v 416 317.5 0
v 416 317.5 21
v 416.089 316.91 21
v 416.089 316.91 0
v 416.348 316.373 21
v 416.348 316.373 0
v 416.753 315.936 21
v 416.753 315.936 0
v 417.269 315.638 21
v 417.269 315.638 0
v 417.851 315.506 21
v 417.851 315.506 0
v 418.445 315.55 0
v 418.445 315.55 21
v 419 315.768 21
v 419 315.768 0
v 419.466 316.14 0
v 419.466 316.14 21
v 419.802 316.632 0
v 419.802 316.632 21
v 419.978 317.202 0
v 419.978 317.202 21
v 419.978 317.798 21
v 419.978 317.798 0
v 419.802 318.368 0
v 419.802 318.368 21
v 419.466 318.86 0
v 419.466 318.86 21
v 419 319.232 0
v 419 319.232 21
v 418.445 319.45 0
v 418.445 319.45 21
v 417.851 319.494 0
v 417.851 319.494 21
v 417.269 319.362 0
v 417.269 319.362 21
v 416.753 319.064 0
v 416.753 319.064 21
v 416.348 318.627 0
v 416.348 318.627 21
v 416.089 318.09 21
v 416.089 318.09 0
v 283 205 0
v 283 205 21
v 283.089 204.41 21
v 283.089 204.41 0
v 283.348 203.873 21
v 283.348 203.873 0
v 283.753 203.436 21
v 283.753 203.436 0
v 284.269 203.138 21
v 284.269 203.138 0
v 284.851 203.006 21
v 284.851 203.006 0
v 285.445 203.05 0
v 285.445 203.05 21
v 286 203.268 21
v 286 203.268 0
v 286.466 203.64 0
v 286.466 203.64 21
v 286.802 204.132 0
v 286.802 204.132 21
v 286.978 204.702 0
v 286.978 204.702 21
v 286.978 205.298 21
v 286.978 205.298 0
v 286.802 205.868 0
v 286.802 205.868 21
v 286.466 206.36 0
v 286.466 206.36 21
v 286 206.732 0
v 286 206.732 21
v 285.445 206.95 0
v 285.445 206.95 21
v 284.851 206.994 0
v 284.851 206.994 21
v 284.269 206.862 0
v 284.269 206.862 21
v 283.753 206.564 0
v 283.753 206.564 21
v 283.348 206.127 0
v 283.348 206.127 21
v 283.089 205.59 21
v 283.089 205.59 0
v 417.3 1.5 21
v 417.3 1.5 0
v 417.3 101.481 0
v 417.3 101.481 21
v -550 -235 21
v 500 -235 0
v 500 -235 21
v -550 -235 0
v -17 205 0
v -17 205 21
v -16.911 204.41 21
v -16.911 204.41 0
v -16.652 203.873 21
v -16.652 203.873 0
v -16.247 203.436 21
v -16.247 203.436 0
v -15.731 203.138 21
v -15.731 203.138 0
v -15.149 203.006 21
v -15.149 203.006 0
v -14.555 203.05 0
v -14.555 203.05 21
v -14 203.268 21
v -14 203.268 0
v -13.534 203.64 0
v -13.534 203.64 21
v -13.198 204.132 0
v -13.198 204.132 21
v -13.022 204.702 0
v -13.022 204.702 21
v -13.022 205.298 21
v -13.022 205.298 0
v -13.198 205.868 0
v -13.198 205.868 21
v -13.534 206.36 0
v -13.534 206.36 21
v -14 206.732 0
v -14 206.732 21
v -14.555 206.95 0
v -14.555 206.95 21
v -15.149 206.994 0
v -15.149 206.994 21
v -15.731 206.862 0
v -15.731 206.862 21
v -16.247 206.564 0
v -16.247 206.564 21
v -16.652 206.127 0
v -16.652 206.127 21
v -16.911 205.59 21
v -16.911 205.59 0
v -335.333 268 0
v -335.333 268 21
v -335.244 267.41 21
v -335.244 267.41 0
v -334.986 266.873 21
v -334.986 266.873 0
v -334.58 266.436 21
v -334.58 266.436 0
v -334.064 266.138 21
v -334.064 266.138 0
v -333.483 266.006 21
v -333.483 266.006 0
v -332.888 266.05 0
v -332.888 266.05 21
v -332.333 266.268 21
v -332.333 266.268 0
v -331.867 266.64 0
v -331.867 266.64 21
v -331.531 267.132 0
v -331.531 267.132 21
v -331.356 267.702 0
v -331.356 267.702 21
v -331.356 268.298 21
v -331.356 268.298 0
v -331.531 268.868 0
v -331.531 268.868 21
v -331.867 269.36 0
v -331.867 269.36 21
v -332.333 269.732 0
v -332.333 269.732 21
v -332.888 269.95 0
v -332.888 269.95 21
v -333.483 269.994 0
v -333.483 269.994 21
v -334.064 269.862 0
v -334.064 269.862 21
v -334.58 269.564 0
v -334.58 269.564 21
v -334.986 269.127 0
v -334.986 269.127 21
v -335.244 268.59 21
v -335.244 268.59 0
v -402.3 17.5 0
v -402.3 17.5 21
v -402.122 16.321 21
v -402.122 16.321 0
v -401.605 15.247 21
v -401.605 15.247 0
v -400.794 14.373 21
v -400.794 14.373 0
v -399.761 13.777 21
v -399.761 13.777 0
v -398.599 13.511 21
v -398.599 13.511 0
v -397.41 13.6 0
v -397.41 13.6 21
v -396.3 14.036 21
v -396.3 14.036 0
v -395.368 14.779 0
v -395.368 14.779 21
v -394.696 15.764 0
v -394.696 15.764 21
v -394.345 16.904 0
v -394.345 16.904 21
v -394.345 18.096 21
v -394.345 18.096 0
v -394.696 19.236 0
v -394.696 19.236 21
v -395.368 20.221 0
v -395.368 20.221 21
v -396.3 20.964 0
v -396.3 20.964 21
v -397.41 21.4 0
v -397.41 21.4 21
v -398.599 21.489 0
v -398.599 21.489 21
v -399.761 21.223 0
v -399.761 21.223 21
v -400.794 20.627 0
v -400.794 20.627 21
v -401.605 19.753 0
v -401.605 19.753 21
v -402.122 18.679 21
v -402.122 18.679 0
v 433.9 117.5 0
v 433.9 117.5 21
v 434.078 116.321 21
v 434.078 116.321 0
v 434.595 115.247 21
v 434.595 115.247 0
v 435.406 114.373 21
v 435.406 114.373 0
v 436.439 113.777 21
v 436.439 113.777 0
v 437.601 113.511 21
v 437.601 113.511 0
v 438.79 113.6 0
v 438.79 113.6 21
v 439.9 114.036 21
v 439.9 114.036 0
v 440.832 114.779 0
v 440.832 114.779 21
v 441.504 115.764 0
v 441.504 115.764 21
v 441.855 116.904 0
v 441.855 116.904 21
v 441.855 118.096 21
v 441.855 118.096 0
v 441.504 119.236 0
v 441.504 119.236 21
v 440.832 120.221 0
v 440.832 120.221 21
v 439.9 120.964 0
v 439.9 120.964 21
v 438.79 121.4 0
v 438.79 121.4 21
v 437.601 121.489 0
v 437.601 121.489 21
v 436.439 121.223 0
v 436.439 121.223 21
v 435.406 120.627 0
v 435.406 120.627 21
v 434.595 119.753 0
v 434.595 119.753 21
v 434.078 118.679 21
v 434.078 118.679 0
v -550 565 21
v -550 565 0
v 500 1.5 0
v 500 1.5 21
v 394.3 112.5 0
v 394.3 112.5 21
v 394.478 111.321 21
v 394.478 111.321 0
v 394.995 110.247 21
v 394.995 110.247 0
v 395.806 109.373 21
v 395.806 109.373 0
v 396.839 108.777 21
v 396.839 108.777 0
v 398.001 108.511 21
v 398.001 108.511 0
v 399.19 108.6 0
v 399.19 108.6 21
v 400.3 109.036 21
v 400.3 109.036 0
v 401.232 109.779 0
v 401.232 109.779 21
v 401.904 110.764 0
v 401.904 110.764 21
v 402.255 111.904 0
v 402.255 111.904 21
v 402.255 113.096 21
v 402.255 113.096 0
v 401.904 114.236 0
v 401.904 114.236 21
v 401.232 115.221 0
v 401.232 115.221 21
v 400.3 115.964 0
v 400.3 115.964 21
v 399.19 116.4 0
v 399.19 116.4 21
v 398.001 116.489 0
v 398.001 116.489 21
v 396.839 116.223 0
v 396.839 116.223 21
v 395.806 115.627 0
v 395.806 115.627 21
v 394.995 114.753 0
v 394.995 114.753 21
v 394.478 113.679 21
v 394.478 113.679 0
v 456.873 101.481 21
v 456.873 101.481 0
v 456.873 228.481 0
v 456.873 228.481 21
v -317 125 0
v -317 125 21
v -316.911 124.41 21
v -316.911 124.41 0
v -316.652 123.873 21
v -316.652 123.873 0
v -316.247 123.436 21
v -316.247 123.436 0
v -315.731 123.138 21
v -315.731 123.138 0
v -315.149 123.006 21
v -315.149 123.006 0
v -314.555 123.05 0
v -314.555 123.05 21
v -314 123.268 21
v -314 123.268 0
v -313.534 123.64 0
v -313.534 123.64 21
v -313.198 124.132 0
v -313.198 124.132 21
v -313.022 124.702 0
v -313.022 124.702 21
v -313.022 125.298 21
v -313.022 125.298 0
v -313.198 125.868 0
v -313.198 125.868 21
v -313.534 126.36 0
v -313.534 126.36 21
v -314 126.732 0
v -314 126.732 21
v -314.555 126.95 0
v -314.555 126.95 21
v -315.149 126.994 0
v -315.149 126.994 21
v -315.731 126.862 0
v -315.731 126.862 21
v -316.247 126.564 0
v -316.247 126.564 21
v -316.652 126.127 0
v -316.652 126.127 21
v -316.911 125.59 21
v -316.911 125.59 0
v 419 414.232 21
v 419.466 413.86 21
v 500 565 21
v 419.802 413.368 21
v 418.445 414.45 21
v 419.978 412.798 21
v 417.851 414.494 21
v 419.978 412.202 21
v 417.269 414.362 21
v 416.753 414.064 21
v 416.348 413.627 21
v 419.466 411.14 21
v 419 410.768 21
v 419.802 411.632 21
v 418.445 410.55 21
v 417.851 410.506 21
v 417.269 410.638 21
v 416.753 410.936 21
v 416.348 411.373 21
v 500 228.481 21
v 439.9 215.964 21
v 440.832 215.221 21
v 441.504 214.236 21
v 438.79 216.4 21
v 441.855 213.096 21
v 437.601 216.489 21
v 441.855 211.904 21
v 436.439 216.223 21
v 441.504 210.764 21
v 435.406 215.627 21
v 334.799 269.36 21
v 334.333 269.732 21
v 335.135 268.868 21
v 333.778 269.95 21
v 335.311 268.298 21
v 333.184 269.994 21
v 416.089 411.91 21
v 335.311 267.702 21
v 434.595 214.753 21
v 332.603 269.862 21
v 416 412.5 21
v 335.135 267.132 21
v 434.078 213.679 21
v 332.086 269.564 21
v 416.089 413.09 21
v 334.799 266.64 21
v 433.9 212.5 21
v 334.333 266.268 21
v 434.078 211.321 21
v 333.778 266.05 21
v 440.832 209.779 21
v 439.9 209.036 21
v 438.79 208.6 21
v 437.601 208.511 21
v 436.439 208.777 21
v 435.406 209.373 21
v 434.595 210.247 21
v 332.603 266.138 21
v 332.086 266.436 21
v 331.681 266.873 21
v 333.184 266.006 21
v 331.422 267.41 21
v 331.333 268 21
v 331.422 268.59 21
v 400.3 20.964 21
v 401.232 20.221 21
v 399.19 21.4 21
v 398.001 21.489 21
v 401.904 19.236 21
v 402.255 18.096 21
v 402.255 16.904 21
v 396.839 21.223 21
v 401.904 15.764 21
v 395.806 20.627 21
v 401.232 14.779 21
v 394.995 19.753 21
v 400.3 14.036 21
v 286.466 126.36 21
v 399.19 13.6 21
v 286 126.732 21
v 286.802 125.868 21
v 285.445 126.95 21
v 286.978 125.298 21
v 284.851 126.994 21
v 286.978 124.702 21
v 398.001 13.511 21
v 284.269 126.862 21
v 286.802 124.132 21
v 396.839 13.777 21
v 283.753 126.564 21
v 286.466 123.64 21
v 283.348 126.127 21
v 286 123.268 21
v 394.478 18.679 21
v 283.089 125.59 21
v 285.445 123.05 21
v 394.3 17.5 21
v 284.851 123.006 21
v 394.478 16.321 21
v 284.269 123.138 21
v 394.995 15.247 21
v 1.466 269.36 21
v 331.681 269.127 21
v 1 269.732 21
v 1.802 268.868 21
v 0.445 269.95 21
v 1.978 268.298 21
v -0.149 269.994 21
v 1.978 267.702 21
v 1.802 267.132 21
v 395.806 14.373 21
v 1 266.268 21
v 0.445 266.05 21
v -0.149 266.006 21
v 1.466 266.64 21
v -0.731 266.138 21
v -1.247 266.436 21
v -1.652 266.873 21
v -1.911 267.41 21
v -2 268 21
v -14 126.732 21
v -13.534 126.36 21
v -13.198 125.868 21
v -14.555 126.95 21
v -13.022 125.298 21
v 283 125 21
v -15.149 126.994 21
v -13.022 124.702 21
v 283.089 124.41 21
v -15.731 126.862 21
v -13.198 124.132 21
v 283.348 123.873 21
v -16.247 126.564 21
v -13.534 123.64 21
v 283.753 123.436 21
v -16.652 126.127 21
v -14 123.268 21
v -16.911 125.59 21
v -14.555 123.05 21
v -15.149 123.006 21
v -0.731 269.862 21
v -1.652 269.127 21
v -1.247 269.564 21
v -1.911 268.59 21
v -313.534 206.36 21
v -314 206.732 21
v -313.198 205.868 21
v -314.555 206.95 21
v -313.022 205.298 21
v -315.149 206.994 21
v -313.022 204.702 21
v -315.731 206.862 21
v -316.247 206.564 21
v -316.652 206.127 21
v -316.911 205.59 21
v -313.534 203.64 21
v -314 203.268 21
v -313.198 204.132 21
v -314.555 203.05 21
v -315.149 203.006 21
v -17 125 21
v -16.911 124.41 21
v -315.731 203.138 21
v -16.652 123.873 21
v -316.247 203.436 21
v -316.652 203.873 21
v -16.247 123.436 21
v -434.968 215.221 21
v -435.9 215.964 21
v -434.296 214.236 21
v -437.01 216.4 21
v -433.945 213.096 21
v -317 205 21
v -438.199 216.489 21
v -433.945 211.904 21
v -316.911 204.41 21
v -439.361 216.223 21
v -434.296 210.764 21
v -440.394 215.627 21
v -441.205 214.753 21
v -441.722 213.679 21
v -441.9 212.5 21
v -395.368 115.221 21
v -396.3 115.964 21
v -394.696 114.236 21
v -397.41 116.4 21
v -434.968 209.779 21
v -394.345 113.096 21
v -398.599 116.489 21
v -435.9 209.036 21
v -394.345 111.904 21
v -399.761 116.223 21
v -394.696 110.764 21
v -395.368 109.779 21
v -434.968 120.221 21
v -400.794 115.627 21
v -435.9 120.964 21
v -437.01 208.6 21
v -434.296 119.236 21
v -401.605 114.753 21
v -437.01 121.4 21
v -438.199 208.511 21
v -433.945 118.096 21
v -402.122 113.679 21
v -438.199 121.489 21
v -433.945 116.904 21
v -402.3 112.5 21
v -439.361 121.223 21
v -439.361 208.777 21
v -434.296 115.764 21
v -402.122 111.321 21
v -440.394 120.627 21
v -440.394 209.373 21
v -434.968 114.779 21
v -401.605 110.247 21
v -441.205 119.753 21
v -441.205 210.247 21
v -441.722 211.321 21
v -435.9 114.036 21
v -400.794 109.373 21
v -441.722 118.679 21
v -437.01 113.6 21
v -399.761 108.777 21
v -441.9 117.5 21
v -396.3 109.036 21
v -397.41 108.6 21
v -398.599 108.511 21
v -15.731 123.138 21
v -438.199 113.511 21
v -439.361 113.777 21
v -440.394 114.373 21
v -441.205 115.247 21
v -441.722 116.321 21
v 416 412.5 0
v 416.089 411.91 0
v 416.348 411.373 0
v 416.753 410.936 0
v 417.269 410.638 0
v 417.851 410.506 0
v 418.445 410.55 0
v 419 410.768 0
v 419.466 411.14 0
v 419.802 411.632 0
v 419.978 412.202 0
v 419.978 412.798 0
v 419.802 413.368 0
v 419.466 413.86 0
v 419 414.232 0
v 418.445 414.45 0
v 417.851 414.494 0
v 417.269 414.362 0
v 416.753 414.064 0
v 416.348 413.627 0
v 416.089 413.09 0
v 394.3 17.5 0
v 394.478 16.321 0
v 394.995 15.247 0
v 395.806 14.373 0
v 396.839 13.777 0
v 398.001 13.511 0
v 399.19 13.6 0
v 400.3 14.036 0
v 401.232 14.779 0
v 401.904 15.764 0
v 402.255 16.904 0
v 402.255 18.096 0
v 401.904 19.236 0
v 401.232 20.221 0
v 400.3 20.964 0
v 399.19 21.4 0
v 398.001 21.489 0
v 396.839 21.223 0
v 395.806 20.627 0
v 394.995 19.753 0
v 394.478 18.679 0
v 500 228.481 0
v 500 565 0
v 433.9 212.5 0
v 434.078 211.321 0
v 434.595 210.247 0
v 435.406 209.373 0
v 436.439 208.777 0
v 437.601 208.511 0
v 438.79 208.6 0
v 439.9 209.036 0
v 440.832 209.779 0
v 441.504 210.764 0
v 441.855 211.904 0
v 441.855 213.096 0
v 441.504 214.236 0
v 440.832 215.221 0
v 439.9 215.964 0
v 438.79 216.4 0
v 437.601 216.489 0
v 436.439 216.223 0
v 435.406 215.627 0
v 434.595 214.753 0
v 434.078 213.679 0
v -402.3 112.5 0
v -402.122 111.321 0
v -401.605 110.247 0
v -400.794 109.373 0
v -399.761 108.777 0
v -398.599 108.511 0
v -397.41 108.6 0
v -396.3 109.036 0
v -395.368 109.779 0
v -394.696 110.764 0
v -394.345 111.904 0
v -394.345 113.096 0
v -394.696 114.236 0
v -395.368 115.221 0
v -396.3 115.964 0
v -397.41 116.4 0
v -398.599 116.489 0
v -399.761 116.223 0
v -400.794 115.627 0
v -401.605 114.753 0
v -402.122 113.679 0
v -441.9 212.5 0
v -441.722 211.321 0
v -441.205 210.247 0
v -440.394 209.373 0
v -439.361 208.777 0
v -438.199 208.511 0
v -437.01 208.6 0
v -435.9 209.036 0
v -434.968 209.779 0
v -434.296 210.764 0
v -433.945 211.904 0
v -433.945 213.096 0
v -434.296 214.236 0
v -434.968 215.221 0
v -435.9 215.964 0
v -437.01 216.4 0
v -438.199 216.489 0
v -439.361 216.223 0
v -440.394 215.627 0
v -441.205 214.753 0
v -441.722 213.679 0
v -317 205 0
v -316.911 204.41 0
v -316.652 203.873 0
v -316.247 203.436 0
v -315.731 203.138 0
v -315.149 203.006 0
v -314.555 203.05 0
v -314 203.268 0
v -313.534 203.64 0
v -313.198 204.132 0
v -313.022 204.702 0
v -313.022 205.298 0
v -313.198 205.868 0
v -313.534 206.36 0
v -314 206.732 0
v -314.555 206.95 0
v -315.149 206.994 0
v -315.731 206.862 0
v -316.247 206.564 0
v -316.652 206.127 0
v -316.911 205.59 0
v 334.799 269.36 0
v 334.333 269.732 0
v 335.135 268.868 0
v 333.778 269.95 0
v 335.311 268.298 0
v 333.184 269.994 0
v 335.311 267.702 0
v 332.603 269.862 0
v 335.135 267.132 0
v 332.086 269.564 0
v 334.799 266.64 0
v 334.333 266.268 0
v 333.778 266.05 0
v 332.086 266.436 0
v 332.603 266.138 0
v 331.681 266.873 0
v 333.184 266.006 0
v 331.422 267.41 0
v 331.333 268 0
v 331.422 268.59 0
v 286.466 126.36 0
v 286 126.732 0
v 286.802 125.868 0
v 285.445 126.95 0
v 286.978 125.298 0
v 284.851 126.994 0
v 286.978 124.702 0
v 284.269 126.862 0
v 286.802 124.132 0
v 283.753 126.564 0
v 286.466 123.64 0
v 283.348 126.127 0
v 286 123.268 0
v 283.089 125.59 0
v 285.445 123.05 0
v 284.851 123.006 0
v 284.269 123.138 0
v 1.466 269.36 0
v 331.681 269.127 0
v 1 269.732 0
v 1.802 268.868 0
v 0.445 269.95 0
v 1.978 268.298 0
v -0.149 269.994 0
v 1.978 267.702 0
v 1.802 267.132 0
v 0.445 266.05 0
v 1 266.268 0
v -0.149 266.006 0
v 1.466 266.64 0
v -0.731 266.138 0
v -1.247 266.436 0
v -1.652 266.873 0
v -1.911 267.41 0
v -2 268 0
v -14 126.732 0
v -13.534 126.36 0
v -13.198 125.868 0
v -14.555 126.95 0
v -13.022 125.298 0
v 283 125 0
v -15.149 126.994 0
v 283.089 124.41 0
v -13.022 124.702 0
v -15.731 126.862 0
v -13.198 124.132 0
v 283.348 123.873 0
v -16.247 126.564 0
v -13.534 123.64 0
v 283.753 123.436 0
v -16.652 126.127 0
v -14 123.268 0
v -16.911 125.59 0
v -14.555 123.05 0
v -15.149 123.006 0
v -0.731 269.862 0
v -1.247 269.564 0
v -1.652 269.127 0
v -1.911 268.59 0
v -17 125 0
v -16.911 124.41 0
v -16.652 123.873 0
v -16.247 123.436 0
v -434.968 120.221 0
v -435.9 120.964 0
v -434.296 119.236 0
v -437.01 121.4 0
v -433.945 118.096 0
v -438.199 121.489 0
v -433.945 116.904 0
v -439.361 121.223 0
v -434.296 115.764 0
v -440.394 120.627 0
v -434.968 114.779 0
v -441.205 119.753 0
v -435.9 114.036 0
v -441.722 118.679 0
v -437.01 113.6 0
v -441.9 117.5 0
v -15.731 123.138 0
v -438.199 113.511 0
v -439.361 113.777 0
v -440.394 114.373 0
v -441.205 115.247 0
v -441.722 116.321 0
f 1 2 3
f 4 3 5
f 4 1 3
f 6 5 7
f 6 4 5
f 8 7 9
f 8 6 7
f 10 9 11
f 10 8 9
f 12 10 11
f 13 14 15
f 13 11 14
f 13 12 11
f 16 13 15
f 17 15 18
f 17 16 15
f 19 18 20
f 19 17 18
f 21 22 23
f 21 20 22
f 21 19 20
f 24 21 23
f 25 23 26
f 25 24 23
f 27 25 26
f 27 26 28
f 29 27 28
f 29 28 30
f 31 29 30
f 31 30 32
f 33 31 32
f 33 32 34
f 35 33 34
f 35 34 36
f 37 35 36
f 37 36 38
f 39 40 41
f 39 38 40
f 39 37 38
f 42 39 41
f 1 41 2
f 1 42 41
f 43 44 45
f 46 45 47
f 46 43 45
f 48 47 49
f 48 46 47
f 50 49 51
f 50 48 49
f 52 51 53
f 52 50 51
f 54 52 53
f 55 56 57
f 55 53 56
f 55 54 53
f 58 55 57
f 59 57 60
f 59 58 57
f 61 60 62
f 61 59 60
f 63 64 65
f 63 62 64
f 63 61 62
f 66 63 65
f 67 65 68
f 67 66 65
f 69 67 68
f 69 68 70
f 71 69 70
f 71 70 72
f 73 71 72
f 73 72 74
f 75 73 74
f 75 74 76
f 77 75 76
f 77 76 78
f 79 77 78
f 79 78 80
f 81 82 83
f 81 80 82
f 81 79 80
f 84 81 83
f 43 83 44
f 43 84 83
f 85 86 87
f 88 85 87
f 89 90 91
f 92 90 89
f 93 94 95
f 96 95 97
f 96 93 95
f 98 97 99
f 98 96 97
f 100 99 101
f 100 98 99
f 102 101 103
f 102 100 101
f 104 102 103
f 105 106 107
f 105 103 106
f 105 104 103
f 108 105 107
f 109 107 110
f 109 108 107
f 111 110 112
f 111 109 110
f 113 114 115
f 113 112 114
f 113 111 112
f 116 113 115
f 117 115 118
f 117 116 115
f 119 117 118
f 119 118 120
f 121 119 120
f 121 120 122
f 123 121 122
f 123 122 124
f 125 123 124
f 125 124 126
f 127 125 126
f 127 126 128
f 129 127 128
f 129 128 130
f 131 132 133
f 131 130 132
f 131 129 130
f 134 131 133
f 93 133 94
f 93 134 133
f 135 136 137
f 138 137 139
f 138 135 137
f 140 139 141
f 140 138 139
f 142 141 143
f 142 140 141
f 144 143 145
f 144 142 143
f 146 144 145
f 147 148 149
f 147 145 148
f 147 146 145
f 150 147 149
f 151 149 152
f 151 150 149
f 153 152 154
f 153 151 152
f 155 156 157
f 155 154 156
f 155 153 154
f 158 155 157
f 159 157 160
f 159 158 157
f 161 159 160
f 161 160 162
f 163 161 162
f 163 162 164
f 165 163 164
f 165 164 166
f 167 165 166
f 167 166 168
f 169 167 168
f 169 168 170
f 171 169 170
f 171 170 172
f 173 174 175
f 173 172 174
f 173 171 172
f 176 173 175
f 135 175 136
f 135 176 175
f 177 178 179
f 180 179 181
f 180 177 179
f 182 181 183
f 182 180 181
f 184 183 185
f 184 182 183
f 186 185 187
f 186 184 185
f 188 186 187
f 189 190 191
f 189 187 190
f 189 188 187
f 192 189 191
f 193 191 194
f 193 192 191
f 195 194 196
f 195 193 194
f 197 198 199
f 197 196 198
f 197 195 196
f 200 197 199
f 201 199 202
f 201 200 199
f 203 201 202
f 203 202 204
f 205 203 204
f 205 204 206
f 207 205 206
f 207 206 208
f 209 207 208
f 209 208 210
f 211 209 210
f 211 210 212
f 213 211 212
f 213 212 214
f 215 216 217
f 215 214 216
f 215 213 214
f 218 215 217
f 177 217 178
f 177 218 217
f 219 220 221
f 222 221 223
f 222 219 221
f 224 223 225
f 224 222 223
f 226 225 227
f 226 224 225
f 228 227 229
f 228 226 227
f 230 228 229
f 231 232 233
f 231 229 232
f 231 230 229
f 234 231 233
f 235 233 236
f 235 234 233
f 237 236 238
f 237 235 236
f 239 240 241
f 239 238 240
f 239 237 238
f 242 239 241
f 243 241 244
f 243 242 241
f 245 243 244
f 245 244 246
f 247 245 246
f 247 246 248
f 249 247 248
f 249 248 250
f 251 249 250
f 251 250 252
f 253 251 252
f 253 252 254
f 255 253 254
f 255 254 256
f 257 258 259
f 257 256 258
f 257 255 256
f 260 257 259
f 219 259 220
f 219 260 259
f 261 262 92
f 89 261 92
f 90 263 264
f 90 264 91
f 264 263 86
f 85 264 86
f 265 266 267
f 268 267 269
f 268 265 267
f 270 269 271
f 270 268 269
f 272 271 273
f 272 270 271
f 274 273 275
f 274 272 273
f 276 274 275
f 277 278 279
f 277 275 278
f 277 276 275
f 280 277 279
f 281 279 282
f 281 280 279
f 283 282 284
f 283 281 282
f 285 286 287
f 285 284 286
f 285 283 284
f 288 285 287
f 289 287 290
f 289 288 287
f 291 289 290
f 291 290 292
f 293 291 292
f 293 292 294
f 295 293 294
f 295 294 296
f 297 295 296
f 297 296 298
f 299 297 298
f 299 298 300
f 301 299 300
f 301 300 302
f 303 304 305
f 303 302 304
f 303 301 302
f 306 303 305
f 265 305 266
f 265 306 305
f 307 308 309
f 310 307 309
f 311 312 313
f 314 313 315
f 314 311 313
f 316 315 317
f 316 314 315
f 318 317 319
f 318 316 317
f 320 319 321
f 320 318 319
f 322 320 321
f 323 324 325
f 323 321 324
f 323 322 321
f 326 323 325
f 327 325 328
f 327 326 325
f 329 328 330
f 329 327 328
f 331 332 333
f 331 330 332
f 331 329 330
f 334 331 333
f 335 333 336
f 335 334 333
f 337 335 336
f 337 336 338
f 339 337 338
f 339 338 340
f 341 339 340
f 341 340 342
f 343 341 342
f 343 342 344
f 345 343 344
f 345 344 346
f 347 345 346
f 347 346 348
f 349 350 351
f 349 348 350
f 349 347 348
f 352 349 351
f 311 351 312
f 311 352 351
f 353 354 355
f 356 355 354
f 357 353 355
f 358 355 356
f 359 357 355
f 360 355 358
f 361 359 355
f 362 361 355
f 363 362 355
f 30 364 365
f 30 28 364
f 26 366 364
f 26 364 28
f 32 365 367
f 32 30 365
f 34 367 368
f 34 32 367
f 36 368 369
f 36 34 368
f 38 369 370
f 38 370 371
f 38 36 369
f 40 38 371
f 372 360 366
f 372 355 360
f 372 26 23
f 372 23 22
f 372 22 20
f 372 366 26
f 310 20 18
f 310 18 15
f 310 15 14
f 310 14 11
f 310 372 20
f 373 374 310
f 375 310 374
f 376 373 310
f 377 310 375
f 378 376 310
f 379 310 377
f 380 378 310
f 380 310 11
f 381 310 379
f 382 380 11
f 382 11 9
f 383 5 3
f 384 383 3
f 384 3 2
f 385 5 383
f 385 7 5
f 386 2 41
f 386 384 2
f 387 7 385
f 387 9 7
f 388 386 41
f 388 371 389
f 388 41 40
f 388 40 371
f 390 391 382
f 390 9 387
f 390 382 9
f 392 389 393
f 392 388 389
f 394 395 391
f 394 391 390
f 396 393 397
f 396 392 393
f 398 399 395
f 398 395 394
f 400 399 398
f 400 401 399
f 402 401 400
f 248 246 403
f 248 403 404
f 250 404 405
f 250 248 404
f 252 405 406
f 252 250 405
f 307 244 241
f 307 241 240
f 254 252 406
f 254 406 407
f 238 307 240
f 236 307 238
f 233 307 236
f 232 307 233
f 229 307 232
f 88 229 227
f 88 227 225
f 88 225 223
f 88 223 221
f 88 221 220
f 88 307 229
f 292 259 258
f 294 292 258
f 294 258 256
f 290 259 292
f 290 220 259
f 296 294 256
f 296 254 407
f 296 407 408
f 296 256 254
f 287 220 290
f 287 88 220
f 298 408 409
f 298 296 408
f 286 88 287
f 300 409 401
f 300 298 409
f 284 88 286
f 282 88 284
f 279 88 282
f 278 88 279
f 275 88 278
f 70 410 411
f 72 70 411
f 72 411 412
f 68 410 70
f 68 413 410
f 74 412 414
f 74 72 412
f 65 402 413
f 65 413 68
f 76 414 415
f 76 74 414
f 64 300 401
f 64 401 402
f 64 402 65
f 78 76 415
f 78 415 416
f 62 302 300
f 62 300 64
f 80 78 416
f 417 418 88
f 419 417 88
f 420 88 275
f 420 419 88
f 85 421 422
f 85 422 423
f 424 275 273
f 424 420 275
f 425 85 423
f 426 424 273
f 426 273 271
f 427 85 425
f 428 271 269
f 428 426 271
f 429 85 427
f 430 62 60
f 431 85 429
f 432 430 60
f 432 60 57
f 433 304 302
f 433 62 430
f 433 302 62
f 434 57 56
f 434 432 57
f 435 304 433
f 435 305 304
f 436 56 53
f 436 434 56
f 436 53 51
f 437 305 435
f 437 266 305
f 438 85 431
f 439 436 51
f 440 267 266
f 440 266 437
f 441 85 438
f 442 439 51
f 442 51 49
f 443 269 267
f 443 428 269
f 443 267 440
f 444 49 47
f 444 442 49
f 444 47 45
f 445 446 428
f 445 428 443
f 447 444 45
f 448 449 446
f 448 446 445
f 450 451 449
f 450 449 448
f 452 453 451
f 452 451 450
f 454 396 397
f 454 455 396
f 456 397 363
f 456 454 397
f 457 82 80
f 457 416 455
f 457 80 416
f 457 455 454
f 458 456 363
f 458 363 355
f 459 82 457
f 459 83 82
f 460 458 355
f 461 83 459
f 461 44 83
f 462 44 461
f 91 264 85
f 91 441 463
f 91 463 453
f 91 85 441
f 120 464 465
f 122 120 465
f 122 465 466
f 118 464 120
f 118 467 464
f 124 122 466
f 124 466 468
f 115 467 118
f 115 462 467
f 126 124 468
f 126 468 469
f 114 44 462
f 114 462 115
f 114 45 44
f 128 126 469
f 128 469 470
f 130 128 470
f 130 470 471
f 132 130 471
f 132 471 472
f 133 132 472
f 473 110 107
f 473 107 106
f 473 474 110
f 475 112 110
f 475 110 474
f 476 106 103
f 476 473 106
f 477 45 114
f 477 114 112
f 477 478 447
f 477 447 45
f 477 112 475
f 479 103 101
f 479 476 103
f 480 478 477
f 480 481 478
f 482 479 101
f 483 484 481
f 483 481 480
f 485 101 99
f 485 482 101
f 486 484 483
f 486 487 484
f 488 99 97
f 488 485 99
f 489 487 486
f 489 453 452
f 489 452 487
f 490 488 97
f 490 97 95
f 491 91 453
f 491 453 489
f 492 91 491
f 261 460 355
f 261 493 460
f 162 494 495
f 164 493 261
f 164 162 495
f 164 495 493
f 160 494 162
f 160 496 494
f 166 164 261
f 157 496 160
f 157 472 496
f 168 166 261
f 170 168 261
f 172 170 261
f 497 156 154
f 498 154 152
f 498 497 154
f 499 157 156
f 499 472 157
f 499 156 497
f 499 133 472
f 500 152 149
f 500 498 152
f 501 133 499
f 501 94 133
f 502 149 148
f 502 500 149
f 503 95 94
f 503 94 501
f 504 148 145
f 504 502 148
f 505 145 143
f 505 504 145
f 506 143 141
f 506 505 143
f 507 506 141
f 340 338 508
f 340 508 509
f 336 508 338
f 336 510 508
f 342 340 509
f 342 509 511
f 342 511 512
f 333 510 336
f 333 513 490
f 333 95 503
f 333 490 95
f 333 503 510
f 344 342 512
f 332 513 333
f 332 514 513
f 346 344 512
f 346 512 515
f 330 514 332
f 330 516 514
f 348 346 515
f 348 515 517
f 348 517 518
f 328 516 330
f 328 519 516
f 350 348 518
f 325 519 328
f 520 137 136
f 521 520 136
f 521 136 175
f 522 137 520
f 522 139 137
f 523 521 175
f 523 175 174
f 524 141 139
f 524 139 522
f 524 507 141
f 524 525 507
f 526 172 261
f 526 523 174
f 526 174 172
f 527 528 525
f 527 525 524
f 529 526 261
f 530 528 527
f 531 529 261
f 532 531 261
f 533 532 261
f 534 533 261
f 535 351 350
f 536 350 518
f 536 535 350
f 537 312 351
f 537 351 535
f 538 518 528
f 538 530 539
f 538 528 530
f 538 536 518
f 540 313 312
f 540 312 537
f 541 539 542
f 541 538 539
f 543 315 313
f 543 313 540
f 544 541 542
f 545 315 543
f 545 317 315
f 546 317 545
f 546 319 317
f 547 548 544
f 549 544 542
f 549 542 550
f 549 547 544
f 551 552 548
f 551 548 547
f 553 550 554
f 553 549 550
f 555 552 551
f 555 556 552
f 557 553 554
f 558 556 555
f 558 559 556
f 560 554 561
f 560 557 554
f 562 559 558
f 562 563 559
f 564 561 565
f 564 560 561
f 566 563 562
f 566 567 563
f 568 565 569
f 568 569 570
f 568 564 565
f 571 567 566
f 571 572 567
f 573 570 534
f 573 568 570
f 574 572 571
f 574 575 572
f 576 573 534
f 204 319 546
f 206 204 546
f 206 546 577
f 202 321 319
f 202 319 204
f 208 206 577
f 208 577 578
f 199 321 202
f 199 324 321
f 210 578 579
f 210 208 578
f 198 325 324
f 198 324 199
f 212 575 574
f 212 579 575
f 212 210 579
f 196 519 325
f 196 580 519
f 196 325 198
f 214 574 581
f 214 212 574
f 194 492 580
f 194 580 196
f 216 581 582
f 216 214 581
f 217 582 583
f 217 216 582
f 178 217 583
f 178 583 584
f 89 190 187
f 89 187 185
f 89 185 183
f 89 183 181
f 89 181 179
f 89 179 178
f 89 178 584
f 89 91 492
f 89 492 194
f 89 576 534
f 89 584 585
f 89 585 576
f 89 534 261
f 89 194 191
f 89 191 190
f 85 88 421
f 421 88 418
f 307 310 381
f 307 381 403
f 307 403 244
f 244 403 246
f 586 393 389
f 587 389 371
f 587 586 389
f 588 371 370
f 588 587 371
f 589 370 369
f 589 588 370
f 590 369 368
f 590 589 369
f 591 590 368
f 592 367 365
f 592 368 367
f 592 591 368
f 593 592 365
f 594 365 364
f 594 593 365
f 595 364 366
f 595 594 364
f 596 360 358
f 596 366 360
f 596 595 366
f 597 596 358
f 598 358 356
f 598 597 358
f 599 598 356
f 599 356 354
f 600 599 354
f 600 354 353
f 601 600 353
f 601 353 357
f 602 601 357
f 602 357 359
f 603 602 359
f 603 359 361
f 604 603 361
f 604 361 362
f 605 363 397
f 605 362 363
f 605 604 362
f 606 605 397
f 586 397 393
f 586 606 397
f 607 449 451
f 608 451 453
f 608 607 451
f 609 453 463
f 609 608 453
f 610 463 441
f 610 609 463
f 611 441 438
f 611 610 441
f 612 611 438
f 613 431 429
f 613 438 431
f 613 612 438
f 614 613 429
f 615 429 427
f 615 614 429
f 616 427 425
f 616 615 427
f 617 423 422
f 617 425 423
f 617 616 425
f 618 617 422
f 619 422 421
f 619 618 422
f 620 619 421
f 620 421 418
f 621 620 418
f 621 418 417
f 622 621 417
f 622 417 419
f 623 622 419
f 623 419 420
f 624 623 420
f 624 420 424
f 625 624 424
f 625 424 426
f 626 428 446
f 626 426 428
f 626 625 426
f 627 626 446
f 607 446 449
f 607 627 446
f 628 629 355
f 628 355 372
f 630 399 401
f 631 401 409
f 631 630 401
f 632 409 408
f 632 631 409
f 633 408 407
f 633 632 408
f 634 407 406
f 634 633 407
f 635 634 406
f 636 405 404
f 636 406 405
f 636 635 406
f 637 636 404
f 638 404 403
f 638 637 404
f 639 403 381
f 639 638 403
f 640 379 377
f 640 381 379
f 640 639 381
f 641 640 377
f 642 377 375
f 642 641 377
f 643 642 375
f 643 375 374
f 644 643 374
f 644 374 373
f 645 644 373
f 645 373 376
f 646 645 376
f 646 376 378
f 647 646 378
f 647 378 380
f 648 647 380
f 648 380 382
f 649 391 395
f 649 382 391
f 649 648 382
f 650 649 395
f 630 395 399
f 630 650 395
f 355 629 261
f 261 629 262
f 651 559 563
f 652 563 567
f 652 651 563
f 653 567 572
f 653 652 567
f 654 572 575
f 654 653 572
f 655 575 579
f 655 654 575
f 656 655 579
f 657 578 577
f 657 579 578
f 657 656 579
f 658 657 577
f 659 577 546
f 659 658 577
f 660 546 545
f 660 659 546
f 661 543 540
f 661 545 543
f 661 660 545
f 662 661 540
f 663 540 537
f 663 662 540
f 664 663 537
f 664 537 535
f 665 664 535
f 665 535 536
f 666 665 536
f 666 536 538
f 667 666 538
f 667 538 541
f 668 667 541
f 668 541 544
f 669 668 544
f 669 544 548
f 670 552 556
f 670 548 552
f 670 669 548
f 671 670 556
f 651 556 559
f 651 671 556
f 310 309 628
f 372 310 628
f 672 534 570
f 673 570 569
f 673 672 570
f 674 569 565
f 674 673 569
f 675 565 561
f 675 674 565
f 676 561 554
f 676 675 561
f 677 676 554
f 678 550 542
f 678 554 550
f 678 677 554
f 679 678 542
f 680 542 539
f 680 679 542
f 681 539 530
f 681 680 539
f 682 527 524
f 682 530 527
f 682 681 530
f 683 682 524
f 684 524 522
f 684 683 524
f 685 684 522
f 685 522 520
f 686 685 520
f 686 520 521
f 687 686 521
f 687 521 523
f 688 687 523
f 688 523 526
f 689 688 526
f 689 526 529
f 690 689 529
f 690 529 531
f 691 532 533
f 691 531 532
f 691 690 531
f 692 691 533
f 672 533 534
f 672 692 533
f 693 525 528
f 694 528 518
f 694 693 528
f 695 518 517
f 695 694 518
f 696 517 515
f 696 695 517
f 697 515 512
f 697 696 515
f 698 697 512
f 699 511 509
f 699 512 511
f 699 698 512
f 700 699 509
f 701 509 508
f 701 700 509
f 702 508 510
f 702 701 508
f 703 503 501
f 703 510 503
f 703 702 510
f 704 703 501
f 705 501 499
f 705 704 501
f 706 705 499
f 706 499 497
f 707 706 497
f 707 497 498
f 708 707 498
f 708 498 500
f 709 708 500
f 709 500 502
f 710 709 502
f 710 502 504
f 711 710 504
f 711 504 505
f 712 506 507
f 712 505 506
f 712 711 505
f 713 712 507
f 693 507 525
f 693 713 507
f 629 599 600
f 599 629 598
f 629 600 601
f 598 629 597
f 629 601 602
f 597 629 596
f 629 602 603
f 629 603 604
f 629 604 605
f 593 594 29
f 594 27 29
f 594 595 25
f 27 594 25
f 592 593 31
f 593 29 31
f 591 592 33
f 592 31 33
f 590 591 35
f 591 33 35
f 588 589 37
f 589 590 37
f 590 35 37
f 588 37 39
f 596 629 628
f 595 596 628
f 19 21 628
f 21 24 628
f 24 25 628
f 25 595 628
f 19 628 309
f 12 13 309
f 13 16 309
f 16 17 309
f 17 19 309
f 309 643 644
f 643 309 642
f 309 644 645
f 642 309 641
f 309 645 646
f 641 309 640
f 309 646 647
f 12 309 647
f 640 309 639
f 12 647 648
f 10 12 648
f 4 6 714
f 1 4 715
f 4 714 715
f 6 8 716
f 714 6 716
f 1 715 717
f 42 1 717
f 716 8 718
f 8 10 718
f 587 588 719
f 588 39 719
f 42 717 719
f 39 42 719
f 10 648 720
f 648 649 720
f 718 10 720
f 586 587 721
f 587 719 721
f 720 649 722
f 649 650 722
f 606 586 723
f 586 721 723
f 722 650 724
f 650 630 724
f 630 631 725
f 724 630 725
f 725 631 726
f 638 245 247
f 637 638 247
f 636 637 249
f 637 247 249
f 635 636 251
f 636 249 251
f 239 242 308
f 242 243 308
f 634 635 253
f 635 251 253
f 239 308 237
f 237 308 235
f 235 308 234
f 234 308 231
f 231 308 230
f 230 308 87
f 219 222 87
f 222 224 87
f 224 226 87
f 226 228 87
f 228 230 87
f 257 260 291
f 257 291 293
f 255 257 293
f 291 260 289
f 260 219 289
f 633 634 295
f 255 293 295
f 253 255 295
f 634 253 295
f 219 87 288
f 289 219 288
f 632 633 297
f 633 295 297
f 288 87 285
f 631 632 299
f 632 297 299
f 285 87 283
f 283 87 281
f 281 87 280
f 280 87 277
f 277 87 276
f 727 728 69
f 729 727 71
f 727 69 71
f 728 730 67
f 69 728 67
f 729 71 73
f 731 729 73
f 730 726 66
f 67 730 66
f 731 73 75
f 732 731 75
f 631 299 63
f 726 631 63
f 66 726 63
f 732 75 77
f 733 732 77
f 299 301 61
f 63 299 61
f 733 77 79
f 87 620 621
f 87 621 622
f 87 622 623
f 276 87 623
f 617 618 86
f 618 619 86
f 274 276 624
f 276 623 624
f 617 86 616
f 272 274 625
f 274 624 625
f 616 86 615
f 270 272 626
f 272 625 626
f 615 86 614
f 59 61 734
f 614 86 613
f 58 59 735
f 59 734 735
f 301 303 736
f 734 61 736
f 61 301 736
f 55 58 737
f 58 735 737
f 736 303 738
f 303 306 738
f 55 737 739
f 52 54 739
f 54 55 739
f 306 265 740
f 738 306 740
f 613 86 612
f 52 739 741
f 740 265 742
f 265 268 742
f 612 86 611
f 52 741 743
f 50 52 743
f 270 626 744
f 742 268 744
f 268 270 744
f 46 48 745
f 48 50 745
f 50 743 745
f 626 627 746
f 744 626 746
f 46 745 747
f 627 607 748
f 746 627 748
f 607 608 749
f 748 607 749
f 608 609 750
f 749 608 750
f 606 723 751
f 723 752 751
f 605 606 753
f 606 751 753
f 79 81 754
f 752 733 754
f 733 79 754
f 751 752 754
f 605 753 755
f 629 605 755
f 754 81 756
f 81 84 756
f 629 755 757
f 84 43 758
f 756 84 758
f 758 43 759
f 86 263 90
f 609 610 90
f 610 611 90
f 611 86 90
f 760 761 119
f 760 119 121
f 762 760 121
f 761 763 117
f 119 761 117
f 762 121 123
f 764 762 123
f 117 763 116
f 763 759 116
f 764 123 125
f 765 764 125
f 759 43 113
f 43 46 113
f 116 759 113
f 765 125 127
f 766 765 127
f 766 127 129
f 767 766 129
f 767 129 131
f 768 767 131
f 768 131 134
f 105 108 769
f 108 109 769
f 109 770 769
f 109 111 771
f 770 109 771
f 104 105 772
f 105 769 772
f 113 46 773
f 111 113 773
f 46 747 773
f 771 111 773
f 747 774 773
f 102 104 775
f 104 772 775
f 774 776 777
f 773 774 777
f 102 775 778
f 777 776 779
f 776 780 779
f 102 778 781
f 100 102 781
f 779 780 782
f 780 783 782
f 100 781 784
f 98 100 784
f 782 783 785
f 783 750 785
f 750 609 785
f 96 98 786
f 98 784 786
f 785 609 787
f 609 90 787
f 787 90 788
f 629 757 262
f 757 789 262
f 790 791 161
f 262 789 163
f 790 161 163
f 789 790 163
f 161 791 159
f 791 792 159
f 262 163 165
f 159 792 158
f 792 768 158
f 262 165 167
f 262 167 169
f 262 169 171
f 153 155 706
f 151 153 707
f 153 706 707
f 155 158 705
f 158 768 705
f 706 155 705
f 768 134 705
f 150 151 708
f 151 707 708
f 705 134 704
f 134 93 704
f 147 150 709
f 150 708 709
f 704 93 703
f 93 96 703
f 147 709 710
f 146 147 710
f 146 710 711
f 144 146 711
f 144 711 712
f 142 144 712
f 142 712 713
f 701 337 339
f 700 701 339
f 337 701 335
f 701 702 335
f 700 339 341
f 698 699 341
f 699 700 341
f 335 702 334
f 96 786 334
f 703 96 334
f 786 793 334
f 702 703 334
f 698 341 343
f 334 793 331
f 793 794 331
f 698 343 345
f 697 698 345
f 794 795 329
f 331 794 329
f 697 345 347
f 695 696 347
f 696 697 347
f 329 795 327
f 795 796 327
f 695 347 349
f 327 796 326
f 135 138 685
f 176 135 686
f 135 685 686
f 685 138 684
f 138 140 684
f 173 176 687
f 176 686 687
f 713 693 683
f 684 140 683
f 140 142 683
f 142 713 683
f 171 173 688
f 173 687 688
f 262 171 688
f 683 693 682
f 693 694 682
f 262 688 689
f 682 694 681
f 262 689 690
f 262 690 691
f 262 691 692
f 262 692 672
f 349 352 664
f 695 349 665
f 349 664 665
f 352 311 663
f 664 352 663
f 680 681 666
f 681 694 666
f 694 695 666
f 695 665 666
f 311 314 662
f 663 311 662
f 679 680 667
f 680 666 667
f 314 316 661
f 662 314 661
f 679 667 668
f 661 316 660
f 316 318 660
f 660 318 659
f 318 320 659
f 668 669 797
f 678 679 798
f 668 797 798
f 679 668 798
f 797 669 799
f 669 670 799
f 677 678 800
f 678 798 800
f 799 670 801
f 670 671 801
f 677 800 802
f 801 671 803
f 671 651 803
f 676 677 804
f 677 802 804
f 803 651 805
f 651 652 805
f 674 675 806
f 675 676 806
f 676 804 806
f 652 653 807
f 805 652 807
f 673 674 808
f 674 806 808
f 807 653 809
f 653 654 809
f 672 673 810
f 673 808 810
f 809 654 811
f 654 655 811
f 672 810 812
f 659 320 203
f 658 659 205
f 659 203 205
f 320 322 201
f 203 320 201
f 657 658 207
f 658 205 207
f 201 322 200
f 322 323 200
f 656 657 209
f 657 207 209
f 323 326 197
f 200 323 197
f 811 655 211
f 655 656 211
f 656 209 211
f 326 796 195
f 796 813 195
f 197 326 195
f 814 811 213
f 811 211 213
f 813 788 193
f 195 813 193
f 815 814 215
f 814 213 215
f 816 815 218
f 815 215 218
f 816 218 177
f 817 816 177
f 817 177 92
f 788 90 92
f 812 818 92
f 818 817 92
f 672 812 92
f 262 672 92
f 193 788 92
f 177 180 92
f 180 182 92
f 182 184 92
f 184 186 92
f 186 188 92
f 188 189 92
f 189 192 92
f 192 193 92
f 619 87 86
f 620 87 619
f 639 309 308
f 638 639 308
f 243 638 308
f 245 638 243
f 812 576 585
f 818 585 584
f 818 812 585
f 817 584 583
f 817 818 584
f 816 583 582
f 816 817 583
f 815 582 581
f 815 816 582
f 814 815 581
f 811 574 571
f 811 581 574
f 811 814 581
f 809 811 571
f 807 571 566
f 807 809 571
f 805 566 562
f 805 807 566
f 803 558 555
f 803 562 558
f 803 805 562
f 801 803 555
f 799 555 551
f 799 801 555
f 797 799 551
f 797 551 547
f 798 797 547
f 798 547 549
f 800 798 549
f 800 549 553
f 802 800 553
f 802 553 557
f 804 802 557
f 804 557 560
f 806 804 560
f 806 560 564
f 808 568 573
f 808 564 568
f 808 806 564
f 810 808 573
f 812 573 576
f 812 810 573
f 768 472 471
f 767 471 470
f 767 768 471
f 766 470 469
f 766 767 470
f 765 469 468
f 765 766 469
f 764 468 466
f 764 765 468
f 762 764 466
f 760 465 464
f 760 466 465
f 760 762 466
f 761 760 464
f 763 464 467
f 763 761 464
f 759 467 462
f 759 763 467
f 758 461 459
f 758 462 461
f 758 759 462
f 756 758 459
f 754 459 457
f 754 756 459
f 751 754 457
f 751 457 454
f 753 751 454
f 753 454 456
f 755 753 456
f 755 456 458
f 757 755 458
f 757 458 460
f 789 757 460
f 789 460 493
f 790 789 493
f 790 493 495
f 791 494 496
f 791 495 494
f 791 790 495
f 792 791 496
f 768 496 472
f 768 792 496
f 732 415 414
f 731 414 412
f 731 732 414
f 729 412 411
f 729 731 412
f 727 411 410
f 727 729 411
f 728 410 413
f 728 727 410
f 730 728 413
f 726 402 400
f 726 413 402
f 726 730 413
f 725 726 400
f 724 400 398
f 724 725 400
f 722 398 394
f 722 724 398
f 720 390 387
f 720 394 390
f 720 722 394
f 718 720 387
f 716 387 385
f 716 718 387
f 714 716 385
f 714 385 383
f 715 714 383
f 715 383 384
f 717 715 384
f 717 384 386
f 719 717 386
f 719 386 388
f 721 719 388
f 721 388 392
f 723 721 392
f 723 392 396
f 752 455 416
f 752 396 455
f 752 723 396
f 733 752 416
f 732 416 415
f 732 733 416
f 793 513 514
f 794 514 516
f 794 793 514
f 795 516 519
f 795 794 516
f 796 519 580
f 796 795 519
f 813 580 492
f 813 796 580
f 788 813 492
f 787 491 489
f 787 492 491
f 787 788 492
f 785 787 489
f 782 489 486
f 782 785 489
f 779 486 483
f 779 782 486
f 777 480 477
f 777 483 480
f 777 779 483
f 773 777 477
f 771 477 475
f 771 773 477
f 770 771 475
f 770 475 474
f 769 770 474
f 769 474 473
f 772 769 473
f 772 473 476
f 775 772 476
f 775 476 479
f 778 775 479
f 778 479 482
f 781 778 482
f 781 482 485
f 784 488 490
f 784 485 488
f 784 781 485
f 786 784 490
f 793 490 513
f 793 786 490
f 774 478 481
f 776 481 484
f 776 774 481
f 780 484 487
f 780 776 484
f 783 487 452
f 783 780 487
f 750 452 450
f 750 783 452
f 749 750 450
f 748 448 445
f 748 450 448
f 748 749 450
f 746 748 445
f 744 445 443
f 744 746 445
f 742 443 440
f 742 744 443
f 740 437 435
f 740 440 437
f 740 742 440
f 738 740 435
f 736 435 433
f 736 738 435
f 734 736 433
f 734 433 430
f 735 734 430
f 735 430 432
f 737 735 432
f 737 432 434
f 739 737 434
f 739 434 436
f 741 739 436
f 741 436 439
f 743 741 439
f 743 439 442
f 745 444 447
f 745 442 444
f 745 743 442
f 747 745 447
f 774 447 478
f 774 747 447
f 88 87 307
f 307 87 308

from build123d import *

# Parameters (mm, degrees)
SKETCH_1_W                                   = 1050
SKETCH_1_H                                   = 800
PAD001_DEPTH                                 = 21
SKETCH003_R                                  = 4
SKETCH003_R_2                                = 2
POCKET_DEPTH                                 = 0.001
POCKET_DEPTH_BACK                            = 21.001
POCKET001_DEPTH                              = 0.001
POCKET001_DEPTH_BACK                         = 21.001
PLYWOOD_CUTTING_ROLL_SUPPORT_PLACEMENT_ANGLE = 180


with BuildPart() as part:
    # Sketch_1 → Pad001 (new body)
    with BuildSketch(Plane.XY):
        with Locations((25, -100)):
            Rectangle(SKETCH_1_W, SKETCH_1_H)
    extrude(amount=PAD001_DEPTH)

    # Sketch003 → Pocket (cut, two sides)
    with BuildSketch(Plane.XY) as pocket_sk:
        with Locations((-398.3, -47.5)):
            Circle(SKETCH003_R)
        with Locations((-398.3, 47.5)):
            Circle(SKETCH003_R)
        with Locations((398.3, -47.5)):
            Circle(SKETCH003_R)
        with Locations((398.3, 47.5)):
            Circle(SKETCH003_R)
        with Locations((-437.9, -147.5)):
            Circle(SKETCH003_R)
        with Locations((-437.9, -52.5)):
            Circle(SKETCH003_R)
        with Locations((437.9, -147.5)):
            Circle(SKETCH003_R)
        with Locations((437.9, -52.5)):
            Circle(SKETCH003_R)
        with Locations((15, -140)):
            Circle(SKETCH003_R_2)
        with Locations((15, -60)):
            Circle(SKETCH003_R_2)
        with Locations((315, -60)):
            Circle(SKETCH003_R_2)
        with Locations((315, -140)):
            Circle(SKETCH003_R_2)
        with Locations((-285, -140)):
            Circle(SKETCH003_R_2)
        with Locations((-285, -60)):
            Circle(SKETCH003_R_2)
        with Locations((-418, -252.5)):
            Circle(SKETCH003_R_2)
        with Locations((-418, -347.5)):
            Circle(SKETCH003_R_2)
        with Locations((0, -203)):
            Circle(SKETCH003_R_2)
        with Locations((333.333333, -203)):
            Circle(SKETCH003_R_2)
        with Locations((-333.333333, -203)):
            Circle(SKETCH003_R_2)
    extrude(amount=-POCKET_DEPTH, mode=Mode.SUBTRACT)
    extrude(pocket_sk.sketch, amount=POCKET_DEPTH_BACK, mode=Mode.SUBTRACT)

    # Sketch008 → Pocket001 (cut, two sides)
    with BuildSketch(Plane.XY) as pocket001_sk:
        Polygon((-417.3, 63.5), (-417.3, -36.480682), (-456.873413, -36.480682), (-456.873413, -163.480682), (-754.283264, -163.480682), (-754.283264, 63.5), align=None)
    extrude(amount=-POCKET001_DEPTH, mode=Mode.SUBTRACT)
    extrude(pocket001_sk.sketch, amount=POCKET001_DEPTH_BACK, mode=Mode.SUBTRACT)


with BuildPart() as part_1:
    # plywood_cutting_roll_support placement: moved
    add(part.part.moved(Location((0, 65, 0))).rotate(Axis((0, 65, 0), (0, 0, 1)), PLYWOOD_CUTTING_ROLL_SUPPORT_PLACEMENT_ANGLE))


solid = part_1.part
